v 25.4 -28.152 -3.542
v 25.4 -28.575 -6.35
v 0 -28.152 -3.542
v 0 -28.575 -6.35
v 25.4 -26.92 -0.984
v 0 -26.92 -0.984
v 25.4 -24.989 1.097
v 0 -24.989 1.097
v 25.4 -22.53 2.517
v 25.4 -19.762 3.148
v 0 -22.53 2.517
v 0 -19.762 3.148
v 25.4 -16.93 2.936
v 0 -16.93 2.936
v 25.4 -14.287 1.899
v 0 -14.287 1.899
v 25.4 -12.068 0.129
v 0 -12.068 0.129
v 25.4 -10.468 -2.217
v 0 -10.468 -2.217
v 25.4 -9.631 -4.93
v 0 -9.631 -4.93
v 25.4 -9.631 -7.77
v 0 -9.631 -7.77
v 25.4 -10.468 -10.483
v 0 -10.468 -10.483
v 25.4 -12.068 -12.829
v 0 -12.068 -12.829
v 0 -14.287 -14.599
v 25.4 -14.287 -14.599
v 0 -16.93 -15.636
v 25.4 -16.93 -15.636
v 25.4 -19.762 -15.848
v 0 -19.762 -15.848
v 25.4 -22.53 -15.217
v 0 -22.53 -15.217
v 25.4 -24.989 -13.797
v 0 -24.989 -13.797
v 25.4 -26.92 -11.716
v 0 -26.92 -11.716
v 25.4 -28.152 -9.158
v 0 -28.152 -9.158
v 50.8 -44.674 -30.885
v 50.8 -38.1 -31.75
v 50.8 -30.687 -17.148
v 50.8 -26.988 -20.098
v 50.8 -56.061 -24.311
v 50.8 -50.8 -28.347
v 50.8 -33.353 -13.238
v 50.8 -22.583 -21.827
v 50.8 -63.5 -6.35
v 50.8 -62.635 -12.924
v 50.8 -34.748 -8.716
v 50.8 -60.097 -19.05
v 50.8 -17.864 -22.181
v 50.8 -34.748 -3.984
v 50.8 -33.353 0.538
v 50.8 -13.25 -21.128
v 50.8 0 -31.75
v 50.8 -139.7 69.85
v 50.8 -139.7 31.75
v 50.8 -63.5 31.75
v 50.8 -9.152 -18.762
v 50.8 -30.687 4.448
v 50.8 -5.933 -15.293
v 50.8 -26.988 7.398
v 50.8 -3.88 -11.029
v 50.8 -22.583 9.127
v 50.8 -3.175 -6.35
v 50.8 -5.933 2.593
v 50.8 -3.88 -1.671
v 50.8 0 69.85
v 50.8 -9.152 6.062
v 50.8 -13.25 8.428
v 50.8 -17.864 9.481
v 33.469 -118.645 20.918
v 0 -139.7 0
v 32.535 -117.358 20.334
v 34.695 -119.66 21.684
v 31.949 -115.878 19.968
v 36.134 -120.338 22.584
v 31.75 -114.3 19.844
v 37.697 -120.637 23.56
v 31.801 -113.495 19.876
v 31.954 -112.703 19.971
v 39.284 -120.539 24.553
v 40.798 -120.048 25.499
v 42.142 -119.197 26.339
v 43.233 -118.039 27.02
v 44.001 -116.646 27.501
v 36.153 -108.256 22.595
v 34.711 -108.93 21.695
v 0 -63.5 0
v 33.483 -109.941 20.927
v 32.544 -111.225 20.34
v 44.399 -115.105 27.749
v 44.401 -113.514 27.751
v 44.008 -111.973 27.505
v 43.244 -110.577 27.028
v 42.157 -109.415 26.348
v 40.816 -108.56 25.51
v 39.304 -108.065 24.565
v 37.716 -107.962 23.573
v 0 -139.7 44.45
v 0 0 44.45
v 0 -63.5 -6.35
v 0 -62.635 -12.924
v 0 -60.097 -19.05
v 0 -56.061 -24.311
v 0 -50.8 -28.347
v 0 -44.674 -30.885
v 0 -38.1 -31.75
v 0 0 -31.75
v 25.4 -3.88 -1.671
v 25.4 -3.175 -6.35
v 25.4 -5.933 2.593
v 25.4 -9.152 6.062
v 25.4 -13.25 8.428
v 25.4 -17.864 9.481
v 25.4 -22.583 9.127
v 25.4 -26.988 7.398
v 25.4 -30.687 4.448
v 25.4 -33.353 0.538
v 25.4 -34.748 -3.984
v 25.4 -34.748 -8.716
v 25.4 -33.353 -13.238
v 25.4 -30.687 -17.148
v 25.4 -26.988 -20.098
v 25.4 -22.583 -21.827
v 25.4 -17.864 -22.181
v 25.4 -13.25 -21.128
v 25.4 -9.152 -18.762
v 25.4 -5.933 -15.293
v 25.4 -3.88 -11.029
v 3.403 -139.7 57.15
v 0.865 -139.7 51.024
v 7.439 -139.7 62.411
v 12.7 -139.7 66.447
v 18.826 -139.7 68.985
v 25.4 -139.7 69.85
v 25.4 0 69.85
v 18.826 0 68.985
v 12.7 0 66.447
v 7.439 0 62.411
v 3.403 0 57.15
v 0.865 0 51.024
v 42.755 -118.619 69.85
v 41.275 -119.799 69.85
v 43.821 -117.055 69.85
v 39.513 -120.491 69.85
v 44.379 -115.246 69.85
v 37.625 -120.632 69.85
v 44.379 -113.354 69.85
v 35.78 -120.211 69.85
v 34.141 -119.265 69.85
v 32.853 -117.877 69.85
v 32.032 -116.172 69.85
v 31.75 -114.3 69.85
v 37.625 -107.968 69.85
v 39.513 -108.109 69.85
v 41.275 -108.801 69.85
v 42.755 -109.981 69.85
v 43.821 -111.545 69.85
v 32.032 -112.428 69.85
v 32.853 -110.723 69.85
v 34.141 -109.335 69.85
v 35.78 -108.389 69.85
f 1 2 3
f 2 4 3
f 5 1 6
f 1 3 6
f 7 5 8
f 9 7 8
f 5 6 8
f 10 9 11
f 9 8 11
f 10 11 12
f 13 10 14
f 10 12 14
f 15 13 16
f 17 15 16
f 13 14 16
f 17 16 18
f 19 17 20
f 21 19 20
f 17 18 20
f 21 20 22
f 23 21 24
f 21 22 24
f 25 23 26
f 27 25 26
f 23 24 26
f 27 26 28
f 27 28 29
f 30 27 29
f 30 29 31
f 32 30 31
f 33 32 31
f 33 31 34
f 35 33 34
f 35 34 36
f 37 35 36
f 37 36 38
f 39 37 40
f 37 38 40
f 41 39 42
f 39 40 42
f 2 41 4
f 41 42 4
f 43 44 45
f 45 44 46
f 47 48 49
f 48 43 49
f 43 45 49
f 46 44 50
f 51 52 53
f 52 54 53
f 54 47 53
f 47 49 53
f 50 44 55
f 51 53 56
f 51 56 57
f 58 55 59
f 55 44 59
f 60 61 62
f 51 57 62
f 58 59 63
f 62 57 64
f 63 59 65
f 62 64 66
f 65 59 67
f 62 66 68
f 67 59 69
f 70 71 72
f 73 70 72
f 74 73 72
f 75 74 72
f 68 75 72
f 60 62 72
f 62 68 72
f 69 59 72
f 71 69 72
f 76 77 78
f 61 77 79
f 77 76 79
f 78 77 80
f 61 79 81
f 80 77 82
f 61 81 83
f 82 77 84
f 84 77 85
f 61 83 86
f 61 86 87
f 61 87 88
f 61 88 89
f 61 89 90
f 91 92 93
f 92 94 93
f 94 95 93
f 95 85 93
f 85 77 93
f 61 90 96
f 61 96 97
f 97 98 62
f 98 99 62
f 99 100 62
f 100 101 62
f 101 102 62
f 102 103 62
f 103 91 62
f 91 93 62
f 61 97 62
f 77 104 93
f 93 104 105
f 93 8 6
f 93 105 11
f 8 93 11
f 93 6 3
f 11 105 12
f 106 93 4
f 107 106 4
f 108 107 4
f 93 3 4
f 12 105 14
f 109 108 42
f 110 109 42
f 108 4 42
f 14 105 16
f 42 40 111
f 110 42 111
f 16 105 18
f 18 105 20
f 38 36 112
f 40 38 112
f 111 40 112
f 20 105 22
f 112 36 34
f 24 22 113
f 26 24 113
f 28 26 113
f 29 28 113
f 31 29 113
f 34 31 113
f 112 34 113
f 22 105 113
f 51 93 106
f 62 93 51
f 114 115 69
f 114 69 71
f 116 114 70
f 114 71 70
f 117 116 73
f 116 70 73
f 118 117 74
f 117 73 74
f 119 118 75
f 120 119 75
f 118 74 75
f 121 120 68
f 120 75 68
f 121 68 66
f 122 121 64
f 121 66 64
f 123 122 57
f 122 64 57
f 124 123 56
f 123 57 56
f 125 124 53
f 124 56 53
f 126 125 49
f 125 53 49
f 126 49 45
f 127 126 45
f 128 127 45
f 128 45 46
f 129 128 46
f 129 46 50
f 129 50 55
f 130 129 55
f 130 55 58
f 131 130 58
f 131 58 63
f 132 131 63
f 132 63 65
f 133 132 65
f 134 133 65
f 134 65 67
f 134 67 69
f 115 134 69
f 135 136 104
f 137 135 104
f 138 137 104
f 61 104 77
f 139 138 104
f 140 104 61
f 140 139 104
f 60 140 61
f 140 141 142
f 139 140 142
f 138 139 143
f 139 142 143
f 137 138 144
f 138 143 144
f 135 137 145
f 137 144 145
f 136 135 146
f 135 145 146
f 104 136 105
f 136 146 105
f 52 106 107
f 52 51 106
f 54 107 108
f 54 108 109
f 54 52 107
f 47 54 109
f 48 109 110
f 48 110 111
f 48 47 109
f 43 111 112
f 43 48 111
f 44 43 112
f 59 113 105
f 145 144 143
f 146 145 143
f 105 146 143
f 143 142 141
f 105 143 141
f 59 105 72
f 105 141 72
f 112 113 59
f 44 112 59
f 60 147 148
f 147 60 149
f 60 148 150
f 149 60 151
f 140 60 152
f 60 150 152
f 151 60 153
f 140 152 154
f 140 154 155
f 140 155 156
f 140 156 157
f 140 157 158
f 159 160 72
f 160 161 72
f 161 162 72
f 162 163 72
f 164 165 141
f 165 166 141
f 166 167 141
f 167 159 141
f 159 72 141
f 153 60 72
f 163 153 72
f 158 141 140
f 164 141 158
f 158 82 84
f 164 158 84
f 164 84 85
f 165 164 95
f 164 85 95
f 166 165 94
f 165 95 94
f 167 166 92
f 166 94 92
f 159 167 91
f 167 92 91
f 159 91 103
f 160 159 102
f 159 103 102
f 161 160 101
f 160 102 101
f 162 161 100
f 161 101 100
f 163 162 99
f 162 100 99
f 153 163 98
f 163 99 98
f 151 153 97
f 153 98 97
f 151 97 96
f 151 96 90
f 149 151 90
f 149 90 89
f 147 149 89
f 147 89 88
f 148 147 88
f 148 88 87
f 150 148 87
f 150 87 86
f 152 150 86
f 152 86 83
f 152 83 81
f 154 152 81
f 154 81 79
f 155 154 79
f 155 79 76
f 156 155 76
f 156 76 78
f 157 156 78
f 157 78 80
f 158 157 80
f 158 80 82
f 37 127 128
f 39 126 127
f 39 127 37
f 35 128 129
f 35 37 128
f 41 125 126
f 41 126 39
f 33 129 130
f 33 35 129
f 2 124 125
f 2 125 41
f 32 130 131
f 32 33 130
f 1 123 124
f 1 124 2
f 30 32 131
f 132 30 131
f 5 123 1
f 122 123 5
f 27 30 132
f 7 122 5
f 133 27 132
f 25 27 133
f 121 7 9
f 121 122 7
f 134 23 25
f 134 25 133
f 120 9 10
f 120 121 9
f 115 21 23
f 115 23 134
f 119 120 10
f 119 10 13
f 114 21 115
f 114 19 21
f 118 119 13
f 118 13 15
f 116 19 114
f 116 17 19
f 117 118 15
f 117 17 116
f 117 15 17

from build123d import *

# Parameters (mm, degrees)
F1_DEPTH       = 139.7
F2_DEPTH       = 63.5
F3_R           = 25.4
F5_D           = 19.05
F5_CBORE_D     = 31.75
F5_CBORE_DEPTH = 25.4
F7_D           = 12.7


with BuildPart() as f1:
    # F0 (on Front) → F1 (new body)
    with BuildSketch(Plane.XZ):
        with BuildLine():
            Line((0, 44.45), (0, 0))
            Line((0, 0), (50.8, 31.75))
            Line((50.8, 31.75), (50.8, 69.85))
            Line((50.8, 69.85), (25.4, 69.85))
            ThreePointArc((25.4, 69.85), (7.439488, 62.410512), (0, 44.45))
        make_face()
    extrude(amount=F1_DEPTH)

    # F0 (on Front) → F2 (join)
    with BuildSketch(Plane.XZ):
        Polygon((50.8, 31.75), (0, 0), (0, -31.75), (50.8, -31.75), align=None)
    extrude(amount=F2_DEPTH)

    # F3
    f3_edges = [f1.edges().sort_by_distance(p)[0] for p in [
        (25.4, -63.5, -31.75),
    ]]
    fillet(f3_edges, radius=F3_R)

    # F5 (through all)
    with Locations(Plane.YZ.offset(50.8)):
        with Locations((-19.05, -6.35)):
            CounterBoreHole(F5_D / 2, F5_CBORE_D / 2, F5_CBORE_DEPTH)

    # F7 (through all)
    with Locations(Plane.XY.offset(69.85)):
        with Locations((38.1, -114.3)):
            Hole(F7_D / 2)


solid = f1.part
